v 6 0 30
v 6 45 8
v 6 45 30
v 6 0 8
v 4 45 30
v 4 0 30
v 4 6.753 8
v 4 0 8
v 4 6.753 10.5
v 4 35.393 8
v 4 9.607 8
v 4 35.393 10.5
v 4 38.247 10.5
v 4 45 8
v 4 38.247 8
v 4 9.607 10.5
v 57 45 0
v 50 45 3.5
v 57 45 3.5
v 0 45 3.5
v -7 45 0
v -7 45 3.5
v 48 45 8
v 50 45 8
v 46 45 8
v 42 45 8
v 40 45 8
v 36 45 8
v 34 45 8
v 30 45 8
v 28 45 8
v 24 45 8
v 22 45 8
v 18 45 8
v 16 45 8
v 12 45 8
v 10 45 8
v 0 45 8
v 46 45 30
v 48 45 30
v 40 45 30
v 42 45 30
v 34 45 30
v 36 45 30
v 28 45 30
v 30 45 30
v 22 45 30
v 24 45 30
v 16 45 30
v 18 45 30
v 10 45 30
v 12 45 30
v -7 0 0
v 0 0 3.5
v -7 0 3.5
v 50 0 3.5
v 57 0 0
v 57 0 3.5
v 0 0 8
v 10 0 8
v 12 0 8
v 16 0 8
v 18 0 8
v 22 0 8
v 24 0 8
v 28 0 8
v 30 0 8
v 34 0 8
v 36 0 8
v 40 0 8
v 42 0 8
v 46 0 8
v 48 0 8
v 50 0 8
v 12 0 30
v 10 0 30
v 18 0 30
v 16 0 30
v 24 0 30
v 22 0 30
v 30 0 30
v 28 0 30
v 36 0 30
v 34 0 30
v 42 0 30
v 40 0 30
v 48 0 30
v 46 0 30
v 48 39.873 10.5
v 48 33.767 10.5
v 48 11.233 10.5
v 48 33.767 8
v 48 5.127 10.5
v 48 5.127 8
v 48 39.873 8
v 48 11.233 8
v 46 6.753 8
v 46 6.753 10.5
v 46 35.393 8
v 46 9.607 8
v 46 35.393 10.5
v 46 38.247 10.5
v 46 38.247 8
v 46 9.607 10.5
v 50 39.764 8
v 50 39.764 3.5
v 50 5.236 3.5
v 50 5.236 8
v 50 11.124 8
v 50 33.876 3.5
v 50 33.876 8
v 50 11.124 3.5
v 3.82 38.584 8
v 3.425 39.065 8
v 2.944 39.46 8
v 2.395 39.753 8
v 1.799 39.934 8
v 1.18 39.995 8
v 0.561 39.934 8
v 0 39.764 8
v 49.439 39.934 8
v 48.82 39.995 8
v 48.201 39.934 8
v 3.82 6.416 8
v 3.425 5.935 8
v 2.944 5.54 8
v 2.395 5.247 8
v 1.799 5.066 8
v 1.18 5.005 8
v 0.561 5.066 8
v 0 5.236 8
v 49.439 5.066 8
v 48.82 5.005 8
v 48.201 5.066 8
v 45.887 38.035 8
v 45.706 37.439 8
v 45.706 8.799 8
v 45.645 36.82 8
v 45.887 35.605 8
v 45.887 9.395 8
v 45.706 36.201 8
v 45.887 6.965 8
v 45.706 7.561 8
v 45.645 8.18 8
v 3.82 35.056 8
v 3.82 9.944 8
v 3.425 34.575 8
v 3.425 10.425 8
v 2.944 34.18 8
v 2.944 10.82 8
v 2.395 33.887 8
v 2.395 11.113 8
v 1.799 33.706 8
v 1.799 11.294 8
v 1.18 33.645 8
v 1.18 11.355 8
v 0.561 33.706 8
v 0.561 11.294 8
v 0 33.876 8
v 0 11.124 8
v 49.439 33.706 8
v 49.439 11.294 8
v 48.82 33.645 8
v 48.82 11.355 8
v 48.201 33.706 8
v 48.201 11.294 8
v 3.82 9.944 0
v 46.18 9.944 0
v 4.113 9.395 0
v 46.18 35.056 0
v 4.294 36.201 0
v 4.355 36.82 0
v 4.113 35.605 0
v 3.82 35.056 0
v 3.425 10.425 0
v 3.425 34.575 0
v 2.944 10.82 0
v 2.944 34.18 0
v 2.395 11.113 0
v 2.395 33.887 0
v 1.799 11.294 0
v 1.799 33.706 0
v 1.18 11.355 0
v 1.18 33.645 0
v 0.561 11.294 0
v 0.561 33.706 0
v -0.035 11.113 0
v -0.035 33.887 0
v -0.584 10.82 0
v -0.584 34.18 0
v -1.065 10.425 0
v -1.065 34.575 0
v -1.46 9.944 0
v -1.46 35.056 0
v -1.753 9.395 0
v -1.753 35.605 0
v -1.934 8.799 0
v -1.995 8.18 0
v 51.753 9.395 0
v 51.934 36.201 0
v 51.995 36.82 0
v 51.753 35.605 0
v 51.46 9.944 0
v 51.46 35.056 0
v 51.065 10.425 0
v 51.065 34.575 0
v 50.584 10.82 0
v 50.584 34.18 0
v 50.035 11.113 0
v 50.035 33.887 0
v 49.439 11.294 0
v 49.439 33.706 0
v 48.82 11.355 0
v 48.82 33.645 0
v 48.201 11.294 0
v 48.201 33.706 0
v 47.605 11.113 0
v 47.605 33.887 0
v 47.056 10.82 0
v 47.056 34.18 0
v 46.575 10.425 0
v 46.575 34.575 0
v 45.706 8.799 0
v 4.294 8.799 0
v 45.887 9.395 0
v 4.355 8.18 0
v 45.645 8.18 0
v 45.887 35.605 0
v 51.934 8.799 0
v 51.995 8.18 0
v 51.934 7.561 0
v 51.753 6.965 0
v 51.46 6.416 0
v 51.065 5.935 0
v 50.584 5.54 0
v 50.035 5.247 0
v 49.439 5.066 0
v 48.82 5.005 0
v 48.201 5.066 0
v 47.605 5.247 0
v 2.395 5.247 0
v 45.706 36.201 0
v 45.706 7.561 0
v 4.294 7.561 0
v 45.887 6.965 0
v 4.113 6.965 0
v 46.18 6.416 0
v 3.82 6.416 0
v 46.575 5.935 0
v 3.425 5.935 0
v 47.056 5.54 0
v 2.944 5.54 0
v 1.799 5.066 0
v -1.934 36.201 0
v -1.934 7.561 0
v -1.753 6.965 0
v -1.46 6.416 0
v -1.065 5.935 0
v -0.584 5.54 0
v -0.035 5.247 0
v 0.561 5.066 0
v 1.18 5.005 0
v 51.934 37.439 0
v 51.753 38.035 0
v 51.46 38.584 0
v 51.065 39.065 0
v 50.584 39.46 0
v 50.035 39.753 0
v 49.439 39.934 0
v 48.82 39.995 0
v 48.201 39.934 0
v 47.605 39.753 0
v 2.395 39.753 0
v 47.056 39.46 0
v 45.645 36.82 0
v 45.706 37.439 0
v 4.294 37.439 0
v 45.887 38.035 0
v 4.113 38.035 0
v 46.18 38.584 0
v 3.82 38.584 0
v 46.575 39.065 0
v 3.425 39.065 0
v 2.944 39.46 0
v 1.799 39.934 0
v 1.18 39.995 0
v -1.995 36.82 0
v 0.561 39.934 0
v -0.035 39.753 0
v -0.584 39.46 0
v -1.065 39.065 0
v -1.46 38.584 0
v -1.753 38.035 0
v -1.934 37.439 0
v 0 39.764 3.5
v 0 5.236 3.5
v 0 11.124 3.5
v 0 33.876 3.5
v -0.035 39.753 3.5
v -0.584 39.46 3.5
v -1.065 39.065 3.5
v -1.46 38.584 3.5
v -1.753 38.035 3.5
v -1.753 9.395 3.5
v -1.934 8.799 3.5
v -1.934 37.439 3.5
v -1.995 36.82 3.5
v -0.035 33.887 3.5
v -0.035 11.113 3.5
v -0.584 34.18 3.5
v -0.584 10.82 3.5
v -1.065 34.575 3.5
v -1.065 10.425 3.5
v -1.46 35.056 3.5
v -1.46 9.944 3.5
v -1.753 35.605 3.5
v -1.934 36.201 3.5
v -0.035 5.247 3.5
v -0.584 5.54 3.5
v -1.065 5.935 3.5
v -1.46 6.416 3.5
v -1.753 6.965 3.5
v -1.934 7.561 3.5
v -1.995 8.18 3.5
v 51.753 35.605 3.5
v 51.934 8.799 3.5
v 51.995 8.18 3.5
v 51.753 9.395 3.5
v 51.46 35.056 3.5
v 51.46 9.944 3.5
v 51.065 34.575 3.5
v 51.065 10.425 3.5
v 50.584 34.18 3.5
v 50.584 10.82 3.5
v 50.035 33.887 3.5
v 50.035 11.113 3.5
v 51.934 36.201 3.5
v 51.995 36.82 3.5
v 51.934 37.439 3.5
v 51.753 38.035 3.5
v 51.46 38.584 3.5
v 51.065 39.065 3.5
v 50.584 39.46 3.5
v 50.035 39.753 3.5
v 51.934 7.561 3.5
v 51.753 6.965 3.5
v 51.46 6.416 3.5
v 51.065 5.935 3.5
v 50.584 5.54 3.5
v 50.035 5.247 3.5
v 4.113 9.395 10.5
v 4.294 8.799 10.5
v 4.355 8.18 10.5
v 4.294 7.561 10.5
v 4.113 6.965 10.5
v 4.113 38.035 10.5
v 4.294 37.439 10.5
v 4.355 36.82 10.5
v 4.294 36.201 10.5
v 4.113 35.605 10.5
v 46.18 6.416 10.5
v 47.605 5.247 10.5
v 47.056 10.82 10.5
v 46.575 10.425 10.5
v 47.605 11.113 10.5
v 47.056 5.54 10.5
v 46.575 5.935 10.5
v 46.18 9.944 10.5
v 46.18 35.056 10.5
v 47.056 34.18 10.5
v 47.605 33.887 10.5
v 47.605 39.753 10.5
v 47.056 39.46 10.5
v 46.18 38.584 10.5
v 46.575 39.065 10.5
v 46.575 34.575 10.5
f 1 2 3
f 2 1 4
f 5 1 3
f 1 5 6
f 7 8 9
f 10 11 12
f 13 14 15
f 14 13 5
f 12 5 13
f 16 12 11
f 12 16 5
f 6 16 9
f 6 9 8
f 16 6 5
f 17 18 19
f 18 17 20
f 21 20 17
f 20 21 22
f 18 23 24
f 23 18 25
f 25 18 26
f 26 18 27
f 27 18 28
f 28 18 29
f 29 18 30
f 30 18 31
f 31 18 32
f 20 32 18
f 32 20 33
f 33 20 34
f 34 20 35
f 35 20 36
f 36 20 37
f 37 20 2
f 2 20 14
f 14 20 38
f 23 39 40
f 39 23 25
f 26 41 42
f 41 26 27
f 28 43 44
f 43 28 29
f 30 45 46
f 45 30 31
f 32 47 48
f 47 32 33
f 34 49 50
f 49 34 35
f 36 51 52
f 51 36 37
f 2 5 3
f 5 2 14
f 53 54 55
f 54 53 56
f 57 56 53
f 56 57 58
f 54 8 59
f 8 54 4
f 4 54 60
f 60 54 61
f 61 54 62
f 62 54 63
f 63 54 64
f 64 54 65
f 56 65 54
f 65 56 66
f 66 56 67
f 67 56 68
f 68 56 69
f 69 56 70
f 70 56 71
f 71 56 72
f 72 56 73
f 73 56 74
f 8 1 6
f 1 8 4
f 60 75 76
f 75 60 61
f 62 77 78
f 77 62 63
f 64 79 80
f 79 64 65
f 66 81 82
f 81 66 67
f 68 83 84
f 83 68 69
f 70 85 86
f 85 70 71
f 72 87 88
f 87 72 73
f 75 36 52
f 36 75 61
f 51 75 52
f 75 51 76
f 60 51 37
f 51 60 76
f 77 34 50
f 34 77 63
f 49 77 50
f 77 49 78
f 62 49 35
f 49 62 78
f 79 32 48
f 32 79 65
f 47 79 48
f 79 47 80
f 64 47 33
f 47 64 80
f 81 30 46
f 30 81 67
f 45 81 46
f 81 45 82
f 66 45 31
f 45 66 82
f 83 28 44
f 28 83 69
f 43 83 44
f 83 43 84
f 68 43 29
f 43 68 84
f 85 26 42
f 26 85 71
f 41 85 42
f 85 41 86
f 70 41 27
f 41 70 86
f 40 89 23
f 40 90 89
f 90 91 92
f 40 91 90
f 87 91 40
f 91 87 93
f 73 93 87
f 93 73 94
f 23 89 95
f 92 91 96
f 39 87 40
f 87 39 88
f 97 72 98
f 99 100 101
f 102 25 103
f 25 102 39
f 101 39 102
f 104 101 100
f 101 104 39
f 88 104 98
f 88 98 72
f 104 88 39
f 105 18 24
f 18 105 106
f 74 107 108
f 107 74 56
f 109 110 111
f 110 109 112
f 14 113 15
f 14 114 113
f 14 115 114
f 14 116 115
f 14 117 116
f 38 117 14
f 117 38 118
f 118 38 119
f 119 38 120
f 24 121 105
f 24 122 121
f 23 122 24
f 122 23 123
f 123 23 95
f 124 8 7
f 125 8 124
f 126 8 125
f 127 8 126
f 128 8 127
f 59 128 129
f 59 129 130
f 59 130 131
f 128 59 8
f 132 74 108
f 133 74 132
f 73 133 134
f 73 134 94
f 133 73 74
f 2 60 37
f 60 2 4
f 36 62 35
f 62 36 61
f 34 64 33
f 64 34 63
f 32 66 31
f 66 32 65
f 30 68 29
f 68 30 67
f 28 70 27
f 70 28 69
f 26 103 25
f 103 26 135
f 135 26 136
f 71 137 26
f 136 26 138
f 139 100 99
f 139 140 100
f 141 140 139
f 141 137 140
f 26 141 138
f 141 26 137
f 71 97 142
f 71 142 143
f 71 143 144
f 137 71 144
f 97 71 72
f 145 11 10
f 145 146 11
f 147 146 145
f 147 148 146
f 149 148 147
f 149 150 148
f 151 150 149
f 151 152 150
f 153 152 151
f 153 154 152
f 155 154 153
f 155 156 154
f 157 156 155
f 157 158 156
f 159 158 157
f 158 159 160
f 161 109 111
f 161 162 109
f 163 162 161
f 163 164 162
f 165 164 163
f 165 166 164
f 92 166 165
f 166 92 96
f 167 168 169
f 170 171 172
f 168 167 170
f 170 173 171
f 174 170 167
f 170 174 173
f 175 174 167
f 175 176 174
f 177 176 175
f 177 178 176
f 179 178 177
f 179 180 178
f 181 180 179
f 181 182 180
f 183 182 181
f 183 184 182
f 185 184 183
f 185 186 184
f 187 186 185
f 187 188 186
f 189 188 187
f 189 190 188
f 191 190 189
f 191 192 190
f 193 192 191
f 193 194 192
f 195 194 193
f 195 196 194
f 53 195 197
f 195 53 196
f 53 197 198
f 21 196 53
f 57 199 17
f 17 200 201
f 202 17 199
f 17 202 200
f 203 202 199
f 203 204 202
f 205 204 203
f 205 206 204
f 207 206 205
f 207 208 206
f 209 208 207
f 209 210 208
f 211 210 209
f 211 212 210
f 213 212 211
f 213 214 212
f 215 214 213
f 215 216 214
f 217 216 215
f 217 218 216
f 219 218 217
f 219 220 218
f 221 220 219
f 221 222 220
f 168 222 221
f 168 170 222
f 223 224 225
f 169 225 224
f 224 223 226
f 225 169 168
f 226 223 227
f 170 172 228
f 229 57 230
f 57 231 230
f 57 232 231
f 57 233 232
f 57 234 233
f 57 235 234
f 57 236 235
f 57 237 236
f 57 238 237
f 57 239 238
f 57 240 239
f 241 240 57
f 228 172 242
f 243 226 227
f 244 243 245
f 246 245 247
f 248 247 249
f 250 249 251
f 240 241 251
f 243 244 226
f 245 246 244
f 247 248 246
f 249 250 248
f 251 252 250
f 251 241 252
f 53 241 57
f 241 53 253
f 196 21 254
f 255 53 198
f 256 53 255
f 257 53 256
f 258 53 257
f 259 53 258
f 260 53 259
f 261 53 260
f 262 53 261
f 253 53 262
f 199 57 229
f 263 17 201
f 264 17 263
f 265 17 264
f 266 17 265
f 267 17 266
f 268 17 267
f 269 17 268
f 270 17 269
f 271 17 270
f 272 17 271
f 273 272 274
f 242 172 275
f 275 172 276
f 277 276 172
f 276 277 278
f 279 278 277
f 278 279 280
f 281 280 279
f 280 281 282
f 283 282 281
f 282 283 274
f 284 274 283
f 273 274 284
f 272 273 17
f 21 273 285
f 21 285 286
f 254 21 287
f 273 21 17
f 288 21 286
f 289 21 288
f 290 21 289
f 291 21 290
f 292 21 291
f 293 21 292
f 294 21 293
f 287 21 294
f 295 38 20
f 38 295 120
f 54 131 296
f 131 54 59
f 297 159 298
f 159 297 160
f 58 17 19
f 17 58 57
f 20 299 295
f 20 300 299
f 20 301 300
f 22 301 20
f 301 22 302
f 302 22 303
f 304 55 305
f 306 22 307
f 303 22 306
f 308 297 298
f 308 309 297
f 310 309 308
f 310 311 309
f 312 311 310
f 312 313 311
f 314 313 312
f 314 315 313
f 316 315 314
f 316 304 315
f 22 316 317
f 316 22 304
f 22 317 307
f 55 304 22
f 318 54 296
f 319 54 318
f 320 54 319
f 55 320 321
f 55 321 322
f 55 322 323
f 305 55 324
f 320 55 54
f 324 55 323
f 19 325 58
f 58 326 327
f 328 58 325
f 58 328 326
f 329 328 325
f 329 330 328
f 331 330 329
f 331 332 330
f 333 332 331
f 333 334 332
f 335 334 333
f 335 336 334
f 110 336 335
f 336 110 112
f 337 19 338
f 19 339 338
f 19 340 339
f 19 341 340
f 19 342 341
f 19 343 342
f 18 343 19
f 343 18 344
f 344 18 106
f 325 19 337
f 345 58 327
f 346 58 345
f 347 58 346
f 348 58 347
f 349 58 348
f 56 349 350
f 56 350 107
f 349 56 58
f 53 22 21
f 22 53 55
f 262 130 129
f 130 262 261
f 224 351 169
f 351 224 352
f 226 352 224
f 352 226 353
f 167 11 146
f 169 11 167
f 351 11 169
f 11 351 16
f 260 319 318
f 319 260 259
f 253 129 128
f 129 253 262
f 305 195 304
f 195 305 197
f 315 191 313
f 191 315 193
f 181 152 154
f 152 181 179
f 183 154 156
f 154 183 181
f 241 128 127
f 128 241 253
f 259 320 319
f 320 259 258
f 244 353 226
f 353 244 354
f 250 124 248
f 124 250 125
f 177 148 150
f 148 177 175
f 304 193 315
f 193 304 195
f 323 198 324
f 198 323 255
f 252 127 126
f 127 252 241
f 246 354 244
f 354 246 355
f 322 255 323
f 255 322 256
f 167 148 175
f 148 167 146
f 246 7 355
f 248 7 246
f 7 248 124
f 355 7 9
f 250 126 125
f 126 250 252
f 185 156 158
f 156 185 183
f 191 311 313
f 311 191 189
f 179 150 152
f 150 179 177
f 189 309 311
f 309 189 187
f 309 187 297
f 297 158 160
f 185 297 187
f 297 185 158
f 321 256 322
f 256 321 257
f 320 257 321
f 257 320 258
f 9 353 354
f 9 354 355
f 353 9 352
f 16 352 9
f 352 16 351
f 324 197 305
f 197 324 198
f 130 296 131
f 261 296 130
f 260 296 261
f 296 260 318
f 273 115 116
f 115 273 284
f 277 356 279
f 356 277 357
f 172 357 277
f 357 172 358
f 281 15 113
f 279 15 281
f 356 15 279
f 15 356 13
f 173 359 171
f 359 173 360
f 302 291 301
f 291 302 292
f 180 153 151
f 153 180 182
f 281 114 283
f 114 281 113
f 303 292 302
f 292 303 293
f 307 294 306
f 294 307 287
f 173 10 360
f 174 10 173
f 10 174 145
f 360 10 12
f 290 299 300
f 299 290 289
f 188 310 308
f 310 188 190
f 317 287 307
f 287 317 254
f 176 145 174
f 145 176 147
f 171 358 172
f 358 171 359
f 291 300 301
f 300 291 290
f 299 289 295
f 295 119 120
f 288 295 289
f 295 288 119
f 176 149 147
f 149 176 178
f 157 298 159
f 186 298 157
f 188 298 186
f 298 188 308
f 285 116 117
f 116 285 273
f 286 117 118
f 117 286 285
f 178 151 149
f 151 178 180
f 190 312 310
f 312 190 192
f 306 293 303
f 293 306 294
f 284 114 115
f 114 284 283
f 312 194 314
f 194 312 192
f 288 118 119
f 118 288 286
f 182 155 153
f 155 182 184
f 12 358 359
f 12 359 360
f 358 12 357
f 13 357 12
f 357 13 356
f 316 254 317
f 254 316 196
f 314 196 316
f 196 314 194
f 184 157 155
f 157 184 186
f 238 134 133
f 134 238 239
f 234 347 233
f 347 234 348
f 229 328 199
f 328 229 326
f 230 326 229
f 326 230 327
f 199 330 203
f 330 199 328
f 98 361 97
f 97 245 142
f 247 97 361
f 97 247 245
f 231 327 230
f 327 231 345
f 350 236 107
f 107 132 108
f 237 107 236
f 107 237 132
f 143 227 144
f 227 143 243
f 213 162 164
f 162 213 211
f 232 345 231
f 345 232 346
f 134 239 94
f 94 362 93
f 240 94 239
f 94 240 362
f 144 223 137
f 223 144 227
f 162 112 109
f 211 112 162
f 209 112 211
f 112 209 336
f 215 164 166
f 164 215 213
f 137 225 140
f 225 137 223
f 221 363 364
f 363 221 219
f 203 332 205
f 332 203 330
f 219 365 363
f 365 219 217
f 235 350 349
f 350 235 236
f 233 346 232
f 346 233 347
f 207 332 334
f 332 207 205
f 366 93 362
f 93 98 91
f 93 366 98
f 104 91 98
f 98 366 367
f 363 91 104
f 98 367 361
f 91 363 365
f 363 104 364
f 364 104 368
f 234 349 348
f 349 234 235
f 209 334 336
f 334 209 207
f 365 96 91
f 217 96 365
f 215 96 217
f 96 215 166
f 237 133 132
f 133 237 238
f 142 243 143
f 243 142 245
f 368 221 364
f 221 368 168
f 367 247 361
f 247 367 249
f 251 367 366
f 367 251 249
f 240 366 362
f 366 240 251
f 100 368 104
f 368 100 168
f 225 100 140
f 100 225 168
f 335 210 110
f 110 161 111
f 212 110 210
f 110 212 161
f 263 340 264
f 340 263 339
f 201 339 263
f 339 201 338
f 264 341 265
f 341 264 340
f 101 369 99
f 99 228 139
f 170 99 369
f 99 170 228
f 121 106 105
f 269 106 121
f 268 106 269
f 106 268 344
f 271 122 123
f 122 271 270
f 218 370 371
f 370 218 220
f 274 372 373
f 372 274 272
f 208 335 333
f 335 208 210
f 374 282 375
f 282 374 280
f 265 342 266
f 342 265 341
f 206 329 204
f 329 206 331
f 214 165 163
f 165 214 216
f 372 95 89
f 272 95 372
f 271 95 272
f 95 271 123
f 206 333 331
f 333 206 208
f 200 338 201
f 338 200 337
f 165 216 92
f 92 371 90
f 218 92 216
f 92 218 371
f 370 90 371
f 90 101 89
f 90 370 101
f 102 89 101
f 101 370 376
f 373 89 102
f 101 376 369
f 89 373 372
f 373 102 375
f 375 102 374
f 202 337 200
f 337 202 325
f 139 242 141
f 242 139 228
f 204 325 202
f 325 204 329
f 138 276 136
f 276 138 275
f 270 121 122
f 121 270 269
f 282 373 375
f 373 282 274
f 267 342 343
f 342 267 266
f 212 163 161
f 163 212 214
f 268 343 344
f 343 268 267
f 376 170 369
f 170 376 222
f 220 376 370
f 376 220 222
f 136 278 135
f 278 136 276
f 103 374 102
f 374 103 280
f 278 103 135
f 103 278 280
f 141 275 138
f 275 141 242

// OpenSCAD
$fn = 32;

// ----------------------------------------------------------------------
// Finned heat sink: 50 x 45 mm base, 22 mm fins
// ----------------------------------------------------------------------

// --- parameters (mm) ---
base_w = 50;              // base width
base_d = 45;              // base depth
base_t = 8;               // base thickness
fin_h = 22;               // fin height above the base
holes_d = 6.35;           // fixing holes
hole_x = 23.82;           // hole offset in x
hole_y = 14.32;           // hole offset in y
fin_t = 2;                // fin thickness
fin_pitch = 6;            // fin pitch
fin_count = 8;            // number of fins
fin_x0 = 4;               // first fin offset
flange_w = 64;            // flange plate width
flange_t = 3;             // flange plate thickness

difference() {
  union() {
    cube([base_w, base_d, base_t]);
    for (i = [0 : fin_count - 1]) {
      translate([fin_x0 + i * fin_pitch, 0, base_t - 0.5]) cube([fin_t, base_d, fin_h + 0.5]);
    }
    /* mounting flange, a wider plate sharing the base bottom */
    translate([(base_w - flange_w) / 2, 0, 0]) cube([flange_w, base_d, flange_t + 0.5]);
  }
  /* fixing holes through the base, 2.5 mm clear on both sides */
  for (hx = [-23.82, 23.82]) {
    for (hy = [-14.32, 14.32]) {
      translate([base_w / 2 + hx, base_d / 2 + hy, -2.5]) cylinder(h = base_t + 5, d = holes_d);
    }
  }
}
